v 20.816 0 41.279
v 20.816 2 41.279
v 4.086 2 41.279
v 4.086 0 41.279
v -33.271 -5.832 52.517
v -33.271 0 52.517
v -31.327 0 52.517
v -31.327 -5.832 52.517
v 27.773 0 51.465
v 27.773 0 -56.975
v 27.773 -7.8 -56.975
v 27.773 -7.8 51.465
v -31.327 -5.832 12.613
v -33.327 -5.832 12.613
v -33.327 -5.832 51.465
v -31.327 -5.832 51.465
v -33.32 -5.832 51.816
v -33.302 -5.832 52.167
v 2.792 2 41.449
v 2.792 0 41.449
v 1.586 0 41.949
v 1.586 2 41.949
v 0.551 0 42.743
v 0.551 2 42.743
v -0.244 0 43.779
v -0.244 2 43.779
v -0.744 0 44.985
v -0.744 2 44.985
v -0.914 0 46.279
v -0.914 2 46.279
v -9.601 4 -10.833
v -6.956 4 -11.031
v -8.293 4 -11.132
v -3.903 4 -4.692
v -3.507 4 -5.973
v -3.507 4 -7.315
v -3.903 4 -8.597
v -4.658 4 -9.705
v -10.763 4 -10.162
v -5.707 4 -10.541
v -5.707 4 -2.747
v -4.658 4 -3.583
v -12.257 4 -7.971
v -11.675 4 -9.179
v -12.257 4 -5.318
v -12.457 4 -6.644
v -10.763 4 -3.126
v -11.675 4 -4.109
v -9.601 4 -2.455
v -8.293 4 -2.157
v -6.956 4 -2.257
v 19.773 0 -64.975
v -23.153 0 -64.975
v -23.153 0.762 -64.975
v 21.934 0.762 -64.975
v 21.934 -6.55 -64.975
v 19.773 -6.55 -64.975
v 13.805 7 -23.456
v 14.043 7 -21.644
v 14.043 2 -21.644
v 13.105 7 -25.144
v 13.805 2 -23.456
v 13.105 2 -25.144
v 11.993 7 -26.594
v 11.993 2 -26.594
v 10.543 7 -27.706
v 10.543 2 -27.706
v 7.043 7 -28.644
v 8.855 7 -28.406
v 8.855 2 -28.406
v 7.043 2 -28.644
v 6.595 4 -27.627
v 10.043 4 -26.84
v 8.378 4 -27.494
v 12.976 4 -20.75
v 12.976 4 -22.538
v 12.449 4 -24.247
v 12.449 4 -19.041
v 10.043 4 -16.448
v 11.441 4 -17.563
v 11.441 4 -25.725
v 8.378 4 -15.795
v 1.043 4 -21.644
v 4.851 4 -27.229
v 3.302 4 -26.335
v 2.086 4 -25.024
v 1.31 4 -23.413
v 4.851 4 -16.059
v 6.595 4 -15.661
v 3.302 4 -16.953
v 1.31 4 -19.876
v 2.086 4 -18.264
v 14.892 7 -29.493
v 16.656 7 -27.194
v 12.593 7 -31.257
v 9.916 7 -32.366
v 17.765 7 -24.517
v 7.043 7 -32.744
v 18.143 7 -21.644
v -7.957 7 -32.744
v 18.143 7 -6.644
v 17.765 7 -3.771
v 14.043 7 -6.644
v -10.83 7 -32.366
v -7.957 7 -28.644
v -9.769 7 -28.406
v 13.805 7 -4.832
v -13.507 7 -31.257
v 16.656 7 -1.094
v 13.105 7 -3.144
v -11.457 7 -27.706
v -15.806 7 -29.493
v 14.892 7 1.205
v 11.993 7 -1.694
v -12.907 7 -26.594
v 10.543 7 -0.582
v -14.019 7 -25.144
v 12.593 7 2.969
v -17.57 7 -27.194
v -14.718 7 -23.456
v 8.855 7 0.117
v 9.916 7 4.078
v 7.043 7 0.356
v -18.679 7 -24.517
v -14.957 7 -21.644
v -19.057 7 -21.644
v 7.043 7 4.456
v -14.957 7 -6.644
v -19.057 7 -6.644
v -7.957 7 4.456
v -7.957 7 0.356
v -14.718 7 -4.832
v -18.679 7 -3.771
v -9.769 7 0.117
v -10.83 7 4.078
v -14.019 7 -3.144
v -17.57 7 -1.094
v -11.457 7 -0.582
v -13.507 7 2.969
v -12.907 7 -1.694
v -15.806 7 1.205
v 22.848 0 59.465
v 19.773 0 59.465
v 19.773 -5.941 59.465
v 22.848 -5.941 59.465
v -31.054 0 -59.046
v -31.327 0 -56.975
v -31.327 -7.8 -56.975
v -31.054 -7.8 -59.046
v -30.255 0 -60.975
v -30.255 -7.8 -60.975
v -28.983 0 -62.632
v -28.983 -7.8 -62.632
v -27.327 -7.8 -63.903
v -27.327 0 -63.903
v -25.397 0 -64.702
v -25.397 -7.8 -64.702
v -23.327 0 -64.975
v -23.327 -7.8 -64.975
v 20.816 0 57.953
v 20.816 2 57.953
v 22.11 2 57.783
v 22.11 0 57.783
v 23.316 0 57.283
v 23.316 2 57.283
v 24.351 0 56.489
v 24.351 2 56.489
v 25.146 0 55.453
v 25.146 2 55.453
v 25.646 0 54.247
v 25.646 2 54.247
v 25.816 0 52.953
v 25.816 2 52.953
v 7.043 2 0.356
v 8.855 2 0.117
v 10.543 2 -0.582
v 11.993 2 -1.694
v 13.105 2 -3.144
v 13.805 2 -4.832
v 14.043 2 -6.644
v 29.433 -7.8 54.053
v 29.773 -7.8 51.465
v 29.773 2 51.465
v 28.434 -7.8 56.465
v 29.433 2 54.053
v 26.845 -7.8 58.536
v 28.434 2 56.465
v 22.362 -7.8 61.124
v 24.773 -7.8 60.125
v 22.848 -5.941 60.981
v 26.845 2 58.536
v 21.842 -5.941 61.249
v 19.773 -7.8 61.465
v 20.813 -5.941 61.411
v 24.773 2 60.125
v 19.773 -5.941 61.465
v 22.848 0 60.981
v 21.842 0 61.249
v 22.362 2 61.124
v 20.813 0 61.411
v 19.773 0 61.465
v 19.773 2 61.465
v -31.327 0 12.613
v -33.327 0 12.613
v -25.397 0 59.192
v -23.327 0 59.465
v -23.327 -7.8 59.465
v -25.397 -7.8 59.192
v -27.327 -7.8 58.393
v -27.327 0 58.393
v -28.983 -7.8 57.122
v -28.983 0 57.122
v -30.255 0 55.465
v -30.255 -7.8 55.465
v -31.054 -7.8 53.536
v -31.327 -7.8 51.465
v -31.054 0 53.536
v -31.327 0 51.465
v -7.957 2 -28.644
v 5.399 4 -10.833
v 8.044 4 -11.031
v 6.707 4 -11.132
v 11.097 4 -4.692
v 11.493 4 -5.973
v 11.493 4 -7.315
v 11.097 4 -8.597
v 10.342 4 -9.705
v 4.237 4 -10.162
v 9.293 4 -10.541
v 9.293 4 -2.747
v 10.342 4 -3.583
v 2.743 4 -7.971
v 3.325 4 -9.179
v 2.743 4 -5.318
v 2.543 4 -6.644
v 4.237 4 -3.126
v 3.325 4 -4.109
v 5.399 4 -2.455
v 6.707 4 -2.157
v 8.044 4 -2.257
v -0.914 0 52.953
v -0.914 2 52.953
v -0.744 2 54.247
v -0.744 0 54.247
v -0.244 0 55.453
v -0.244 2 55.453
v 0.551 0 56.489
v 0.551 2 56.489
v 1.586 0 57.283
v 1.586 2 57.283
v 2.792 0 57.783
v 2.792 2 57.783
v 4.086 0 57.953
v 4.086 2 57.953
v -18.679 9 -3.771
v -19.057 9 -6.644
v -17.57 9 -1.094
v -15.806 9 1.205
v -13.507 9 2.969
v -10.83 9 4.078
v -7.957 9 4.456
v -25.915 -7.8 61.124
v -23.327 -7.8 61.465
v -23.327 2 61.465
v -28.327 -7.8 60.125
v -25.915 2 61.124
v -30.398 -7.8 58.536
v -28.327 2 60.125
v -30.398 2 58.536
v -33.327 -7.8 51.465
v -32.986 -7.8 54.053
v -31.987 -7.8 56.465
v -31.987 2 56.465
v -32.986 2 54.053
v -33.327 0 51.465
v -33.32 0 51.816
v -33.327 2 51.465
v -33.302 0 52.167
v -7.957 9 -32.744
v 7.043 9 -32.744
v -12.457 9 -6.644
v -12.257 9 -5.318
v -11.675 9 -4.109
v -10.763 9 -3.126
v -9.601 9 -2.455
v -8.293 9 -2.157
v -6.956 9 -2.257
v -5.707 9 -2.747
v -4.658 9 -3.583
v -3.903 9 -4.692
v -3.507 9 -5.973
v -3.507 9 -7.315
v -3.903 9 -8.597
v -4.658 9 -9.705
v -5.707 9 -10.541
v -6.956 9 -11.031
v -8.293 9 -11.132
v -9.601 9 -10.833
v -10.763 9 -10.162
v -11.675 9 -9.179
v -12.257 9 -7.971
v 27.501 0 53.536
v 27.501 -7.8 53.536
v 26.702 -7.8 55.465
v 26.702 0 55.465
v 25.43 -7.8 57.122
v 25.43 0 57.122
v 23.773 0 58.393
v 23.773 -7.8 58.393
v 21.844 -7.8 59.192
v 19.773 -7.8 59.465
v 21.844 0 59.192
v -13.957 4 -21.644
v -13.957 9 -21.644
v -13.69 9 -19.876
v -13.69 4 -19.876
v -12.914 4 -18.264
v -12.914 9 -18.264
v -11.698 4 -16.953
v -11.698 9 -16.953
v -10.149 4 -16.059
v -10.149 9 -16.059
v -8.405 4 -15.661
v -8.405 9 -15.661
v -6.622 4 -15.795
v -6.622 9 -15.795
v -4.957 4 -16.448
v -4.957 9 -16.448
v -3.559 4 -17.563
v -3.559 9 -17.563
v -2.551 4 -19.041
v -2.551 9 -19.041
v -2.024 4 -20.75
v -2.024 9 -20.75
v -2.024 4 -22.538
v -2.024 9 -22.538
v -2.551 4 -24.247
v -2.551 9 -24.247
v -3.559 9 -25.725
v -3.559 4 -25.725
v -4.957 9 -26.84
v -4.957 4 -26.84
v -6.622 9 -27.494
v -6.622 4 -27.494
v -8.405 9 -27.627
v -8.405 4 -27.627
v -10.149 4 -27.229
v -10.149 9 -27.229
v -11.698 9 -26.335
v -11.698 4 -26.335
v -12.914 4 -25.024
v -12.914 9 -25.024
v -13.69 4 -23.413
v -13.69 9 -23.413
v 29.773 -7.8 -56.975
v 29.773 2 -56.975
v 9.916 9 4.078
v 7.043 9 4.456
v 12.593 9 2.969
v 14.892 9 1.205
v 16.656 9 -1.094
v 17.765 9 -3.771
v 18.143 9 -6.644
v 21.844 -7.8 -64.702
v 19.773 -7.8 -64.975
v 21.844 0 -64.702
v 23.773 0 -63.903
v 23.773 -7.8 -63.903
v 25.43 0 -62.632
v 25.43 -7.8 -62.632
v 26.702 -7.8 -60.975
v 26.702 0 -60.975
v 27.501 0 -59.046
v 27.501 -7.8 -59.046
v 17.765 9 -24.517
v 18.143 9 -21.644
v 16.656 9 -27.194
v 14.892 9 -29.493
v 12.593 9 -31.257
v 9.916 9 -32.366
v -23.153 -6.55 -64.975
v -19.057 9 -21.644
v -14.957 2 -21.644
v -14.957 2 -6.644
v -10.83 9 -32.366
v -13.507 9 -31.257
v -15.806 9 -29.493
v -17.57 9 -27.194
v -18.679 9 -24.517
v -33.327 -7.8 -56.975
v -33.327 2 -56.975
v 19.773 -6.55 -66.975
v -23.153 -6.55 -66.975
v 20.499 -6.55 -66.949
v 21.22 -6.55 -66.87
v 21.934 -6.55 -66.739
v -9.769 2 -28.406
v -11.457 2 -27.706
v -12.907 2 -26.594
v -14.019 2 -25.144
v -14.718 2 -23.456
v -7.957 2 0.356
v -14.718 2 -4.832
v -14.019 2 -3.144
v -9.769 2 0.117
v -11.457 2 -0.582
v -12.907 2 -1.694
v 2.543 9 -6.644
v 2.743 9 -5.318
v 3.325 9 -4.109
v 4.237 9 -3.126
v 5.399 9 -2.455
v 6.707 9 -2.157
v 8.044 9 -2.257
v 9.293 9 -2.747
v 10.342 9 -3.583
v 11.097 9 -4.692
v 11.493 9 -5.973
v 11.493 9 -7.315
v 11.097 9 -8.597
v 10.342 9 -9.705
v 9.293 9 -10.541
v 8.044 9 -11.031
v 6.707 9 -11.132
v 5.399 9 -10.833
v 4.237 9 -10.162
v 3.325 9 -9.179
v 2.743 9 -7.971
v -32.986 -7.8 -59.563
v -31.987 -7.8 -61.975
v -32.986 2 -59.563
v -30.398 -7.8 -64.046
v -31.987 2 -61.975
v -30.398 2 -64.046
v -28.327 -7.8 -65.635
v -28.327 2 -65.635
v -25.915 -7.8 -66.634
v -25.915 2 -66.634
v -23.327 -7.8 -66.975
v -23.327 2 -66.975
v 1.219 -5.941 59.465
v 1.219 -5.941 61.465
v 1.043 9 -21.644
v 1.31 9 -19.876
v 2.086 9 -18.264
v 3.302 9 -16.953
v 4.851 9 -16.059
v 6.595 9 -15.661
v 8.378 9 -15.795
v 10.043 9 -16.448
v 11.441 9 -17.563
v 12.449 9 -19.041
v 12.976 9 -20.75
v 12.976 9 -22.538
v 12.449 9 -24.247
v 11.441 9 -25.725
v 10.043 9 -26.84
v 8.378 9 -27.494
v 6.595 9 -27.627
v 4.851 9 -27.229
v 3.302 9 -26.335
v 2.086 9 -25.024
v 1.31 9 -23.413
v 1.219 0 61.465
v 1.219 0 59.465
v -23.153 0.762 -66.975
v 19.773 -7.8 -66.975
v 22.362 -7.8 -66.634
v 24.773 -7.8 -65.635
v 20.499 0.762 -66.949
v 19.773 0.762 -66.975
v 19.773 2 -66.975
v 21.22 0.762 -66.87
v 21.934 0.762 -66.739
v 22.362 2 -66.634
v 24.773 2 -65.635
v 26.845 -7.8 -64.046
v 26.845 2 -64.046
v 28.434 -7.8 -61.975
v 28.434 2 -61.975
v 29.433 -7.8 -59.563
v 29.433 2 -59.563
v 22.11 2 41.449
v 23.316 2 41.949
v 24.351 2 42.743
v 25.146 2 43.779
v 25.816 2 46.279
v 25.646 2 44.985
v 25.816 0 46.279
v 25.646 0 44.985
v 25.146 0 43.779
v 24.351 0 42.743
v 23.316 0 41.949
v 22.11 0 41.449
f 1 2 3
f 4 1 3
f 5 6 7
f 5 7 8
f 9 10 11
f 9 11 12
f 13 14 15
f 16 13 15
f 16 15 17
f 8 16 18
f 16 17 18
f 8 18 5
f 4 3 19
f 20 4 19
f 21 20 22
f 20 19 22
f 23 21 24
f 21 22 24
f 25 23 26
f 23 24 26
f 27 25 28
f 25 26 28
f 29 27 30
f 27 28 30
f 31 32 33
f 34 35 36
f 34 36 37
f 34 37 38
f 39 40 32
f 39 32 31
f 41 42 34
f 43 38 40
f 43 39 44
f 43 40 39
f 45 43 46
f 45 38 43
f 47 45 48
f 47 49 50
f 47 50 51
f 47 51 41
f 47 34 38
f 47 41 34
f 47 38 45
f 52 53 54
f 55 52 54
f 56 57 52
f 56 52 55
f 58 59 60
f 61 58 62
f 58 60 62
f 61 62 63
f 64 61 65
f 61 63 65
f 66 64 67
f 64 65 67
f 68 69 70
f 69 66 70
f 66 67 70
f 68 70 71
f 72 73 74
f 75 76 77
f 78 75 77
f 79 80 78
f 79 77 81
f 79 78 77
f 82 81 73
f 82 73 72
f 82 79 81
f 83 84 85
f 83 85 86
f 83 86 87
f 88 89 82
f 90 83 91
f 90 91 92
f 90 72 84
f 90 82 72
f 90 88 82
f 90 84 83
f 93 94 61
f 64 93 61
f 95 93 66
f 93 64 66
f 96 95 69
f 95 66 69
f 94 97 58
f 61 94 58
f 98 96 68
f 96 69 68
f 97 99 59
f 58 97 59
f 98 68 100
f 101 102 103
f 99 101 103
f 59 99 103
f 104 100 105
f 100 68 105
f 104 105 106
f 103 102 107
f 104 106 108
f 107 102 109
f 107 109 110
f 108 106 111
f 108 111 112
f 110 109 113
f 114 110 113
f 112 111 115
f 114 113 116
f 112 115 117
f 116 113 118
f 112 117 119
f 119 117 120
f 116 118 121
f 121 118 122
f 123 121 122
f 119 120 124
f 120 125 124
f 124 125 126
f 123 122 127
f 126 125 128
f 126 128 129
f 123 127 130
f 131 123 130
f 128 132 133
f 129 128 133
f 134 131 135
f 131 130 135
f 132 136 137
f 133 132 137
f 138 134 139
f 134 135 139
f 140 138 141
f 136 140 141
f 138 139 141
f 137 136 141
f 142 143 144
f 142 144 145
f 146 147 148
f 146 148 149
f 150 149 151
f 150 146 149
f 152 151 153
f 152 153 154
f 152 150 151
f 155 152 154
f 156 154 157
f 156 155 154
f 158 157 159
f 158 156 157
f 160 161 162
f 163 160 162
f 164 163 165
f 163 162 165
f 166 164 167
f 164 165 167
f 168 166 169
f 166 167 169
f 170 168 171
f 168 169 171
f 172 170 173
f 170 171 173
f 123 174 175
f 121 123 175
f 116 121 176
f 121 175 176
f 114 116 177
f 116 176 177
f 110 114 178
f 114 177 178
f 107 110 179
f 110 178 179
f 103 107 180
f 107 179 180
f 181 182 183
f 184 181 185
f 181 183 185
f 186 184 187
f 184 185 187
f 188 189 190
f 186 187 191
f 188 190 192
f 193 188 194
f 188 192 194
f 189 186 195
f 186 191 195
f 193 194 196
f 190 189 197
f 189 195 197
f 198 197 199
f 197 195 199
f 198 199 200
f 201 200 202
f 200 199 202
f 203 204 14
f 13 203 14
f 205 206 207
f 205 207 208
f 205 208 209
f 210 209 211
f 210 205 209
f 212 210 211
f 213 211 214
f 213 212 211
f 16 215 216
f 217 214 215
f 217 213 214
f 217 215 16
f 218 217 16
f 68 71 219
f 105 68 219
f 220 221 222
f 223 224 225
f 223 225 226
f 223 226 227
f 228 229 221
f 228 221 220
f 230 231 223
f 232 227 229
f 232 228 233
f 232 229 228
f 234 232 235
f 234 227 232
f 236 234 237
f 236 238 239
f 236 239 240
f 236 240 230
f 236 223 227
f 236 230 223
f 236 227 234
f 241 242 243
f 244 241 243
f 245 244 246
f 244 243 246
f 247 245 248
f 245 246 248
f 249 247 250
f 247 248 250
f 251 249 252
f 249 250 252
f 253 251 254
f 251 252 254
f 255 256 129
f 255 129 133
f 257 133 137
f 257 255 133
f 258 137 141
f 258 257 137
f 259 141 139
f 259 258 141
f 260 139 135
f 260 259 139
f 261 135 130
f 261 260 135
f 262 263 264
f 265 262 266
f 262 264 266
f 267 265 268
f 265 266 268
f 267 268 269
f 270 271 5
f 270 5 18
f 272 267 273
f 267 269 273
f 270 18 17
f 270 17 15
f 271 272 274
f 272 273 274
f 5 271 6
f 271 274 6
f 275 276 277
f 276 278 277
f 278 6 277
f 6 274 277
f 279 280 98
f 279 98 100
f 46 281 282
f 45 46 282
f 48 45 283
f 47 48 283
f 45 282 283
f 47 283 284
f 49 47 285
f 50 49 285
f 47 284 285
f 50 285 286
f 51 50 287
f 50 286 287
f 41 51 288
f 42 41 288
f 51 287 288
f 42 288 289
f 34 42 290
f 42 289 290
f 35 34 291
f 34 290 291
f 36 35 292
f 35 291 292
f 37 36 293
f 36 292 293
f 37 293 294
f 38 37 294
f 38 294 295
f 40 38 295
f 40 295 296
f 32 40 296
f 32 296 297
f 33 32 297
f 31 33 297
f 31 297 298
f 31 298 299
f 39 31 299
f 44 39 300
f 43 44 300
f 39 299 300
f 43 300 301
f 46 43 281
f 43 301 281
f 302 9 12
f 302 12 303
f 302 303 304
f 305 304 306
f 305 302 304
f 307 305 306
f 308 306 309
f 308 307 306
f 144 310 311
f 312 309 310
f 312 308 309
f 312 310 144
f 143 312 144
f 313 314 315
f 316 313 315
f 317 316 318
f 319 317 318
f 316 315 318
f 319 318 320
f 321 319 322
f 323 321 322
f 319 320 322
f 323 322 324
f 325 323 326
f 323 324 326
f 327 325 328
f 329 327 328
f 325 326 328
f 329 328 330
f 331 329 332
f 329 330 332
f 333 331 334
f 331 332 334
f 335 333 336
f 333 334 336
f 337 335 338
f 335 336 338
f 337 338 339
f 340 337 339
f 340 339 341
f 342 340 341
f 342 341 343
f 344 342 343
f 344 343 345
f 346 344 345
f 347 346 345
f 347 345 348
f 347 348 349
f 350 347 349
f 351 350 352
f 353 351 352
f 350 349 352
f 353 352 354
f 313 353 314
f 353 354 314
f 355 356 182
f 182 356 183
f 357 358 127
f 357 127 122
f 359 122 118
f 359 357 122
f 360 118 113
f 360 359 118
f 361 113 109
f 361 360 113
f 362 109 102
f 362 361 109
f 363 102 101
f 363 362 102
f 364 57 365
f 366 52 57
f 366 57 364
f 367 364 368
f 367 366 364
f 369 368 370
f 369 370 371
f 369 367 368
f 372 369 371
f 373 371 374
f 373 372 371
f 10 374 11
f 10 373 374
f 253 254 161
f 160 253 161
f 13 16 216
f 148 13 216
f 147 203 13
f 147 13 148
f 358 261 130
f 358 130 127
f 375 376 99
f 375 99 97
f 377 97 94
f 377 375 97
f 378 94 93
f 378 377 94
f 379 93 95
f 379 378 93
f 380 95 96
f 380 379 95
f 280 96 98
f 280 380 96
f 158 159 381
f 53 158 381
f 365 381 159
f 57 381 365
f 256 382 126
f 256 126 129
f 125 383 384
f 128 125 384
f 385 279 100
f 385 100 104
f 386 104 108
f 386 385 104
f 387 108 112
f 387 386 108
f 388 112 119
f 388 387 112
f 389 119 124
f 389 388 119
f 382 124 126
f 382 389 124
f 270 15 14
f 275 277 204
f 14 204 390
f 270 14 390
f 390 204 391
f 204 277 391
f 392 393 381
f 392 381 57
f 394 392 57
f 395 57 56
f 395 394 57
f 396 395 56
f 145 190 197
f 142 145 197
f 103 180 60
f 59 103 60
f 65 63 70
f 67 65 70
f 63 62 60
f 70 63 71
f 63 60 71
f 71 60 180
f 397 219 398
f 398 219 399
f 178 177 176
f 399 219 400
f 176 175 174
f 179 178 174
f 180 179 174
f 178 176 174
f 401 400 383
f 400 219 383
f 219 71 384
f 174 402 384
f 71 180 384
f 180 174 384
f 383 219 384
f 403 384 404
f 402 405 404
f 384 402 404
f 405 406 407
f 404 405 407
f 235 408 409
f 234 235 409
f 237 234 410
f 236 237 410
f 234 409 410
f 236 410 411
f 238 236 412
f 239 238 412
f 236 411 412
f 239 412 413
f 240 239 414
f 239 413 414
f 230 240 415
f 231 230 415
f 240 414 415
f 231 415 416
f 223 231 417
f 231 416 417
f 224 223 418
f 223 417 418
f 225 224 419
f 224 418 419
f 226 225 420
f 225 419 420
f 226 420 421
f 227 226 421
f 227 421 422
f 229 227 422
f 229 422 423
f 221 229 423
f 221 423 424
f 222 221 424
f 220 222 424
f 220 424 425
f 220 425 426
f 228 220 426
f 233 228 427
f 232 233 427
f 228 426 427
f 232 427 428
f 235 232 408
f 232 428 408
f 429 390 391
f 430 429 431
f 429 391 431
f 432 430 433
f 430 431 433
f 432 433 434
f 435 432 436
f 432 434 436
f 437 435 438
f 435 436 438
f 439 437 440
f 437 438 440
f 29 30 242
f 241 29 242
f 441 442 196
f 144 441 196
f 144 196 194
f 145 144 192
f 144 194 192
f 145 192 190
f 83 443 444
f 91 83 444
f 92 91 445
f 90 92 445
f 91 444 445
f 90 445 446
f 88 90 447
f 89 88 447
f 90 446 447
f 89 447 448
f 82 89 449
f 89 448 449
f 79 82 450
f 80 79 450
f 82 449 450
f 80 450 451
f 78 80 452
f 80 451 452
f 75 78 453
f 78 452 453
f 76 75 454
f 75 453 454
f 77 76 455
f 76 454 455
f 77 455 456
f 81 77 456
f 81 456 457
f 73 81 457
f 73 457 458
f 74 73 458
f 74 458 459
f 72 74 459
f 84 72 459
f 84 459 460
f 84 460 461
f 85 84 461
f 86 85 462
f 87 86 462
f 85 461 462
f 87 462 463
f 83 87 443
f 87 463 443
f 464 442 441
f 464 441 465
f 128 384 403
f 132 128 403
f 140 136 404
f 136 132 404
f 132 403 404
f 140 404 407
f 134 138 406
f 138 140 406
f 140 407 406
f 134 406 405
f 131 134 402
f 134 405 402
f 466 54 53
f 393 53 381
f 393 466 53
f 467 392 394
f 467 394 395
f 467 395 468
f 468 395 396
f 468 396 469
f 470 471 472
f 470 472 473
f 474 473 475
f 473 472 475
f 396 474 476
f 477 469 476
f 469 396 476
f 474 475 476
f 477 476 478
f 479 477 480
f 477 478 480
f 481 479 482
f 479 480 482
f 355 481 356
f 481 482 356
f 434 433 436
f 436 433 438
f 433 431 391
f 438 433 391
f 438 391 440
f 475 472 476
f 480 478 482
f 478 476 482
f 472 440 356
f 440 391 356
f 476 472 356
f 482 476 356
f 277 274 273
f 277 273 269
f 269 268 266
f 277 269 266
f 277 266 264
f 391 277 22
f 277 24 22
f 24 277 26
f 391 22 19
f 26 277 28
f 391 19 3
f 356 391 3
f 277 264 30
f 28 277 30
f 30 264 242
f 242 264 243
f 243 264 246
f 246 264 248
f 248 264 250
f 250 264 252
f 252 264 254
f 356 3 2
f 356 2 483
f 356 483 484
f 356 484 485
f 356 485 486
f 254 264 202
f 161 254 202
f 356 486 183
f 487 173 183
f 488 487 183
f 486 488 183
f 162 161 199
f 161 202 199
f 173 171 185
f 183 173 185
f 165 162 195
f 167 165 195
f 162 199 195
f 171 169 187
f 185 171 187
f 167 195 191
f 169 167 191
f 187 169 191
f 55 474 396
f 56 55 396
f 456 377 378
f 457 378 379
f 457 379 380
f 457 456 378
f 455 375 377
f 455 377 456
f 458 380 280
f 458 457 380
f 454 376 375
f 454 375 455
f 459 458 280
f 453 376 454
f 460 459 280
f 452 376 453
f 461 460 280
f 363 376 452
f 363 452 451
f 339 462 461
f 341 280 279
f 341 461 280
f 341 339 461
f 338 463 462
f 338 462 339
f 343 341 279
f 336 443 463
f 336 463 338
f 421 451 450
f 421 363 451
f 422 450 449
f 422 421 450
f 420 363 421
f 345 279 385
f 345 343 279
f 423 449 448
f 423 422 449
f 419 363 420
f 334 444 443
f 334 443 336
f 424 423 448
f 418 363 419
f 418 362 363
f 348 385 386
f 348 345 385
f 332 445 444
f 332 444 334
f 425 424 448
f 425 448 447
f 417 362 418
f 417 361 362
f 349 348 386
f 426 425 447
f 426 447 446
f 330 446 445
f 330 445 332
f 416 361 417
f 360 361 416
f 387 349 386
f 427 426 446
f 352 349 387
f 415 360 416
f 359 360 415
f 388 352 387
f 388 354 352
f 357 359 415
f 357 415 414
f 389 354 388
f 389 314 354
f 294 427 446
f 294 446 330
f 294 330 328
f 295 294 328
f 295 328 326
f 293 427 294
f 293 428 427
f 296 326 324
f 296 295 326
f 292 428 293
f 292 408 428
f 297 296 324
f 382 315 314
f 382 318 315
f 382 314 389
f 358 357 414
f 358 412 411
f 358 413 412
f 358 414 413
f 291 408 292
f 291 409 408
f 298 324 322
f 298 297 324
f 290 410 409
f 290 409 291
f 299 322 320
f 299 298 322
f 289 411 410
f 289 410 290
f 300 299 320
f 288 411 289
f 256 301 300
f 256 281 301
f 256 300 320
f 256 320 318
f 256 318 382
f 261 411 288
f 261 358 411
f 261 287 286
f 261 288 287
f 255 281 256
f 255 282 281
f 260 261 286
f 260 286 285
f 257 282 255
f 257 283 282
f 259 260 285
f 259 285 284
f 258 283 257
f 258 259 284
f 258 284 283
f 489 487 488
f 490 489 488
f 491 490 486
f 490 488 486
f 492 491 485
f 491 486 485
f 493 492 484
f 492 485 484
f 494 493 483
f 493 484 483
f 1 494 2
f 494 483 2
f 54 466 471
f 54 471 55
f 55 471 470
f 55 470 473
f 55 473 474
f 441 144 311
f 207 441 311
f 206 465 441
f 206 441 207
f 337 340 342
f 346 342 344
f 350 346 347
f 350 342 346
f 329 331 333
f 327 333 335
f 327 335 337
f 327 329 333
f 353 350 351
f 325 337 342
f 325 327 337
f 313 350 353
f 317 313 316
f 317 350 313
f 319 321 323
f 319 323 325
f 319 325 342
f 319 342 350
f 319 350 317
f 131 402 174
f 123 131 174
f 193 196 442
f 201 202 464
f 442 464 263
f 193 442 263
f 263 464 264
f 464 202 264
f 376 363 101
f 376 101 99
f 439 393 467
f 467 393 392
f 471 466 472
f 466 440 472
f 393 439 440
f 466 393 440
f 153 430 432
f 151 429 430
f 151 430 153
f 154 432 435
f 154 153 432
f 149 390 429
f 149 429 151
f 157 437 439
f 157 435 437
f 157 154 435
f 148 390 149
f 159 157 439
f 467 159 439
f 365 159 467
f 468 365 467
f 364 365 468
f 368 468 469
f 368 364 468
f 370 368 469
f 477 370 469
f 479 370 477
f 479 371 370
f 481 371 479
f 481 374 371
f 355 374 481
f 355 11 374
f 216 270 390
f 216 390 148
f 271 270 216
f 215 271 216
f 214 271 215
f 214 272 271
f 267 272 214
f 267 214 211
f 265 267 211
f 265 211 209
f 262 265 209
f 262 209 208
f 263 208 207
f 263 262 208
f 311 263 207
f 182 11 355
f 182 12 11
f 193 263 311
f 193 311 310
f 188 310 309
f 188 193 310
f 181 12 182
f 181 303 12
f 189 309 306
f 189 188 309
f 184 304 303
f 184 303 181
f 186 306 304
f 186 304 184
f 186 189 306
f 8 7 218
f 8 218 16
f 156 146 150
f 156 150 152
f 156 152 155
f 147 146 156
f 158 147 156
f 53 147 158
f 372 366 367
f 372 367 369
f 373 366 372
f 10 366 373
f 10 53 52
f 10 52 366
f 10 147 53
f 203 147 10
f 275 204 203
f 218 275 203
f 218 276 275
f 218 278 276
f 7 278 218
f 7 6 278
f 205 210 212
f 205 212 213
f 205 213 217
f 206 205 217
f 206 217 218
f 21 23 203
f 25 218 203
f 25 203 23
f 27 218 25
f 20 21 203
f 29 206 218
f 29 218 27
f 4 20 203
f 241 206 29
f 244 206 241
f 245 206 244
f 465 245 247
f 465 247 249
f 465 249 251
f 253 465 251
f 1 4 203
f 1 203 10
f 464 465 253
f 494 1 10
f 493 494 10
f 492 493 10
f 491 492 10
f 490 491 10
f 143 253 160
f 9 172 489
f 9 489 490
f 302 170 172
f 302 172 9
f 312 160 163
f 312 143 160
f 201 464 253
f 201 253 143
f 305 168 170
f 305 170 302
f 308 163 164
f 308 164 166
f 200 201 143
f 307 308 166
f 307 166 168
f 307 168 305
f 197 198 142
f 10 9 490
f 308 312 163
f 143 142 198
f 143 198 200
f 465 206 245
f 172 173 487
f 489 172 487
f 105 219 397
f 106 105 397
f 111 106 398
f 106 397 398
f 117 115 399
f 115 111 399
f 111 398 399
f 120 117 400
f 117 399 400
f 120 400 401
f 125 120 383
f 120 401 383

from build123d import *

# Parameters (mm, degrees)
F1_DEPTH  = 7.8
F2_T      = 2
F4_DEPTH  = 9.801
F5_W      = 45.0870413333
F5_H      = 7.3114127154
F6_DEPTH  = 2
F7_W      = 5.831967108
F7_H      = 39.9042963982
F8_DEPTH  = 2
F9_W      = 21.6295962455
F9_H      = 5.9405225329
F10_DEPTH = 2
F13_DEPTH = 7
F16_DEPTH = 2
F14_R     = 4.5
F14_R_2   = 6
F17_DEPTH = 155
F18_DEPTH = 5


# Not quite as in the source:
# - an extrude ends at something that could not be found from the text; its depth is read off the source's solid


with BuildPart() as f1:
    # F0 (on Front) → F1 (new body)
    with BuildSketch(Plane.XZ):
        with BuildLine():
            Line((-23.3265317287, -64.975), (19.7734682713, -64.975))
            ThreePointArc((19.7734682713, -64.975), (25.4303225208, -62.6318542495), (27.7734682713, -56.975))
            Line((27.7734682713, -56.975), (27.7734682713, 51.465))
            ThreePointArc((27.7734682713, 51.465), (25.4303225208, 57.1218542495), (19.7734682713, 59.465))
            Line((19.7734682713, 59.465), (-23.3265317287, 59.465))
            ThreePointArc((-23.3265317287, 59.465), (-28.9833859782, 57.1218542495), (-31.3265317287, 51.465))
            Line((-31.3265317287, 51.465), (-31.3265317287, -56.975))
            ThreePointArc((-31.3265317287, -56.975), (-28.9833859782, -62.6318542495), (-23.3265317287, -64.975))
        make_face()
    extrude(amount=F1_DEPTH)

    # F2
    f2_openings = [f1.faces().sort_by_distance(p)[0] for p in [
        (-1.776532, -7.8, -2.755),
    ]]
    offset(amount=F2_T, openings=f2_openings, kind=Kind.INTERSECTION)

    # F3 (on face) → F4 (cut, through all)
    with BuildSketch(Plane(origin=(0, 2, 0), x_dir=(-1, 0, 0), z_dir=(0, 1, 0))):
        with BuildLine():
            Line((-4.0860684775, 57.9532251436), (-20.8159385248, 57.9532251436))
            ThreePointArc((-20.8159385248, 57.9532251436), (-24.3514724307, 56.4887590495), (-25.8159385248, 52.9532251436))
            Line((-25.8159385248, 52.9532251436), (-25.8159385248, 46.2790104747))
            ThreePointArc((-25.8159385248, 46.2790104747), (-24.3514724307, 42.7434765687), (-20.8159385248, 41.2790104747))
            Line((-20.8159385248, 41.2790104747), (-4.0860684775, 41.2790104747))
            ThreePointArc((-4.0860684775, 41.2790104747), (-0.5505345715, 42.7434765687), (0.9139315225, 46.2790104747))
            Line((0.9139315225, 46.2790104747), (0.9139315225, 52.9532251436))
            ThreePointArc((0.9139315225, 52.9532251436), (-0.5505345715, 56.4887590495), (-4.0860684775, 57.9532251436))
        make_face()
    extrude(amount=-F4_DEPTH, mode=Mode.SUBTRACT)

    # F5 (on face) → F6 (cut)
    with BuildSketch(Plane(origin=(0, 0, -66.975), x_dir=(1, 0, 0), z_dir=(0, 0, -1))):
        with Locations((-0.6092851982, 2.8941009077)):
            Rectangle(F5_W, F5_H)
    extrude(amount=-F6_DEPTH, mode=Mode.SUBTRACT)

    # F7 (on face) → F8 (cut)
    with BuildSketch(Plane(origin=(-33.3265317287, 0, 0), x_dir=(0, -1, 0), z_dir=(-1, 0, 0))):
        with Locations((2.915983554, 32.564714551)):
            Rectangle(F7_W, F7_H)
    extrude(amount=-F8_DEPTH, mode=Mode.SUBTRACT)

    # F9 (on face) → F10 (cut)
    with BuildSketch(Plane.XY.offset(61.465)):
        with Locations((12.0333628147, -2.9702612665)):
            Rectangle(F9_W, F9_H)
    extrude(amount=-F10_DEPTH, mode=Mode.SUBTRACT)

    # F14 (on face) → F17 (cut, through all)
    with BuildSketch(Plane(origin=(0, 9, 0), x_dir=(-1, 0, 0), z_dir=(0, 1, 0))):
        with Locations((-7.0430367999, -6.644173318)):
            Circle(F14_R)
        with Locations((7.9569632001, -6.644173318)):
            Circle(F14_R)
        with Locations((-7.0430367999, -21.644173318)):
            Circle(F14_R_2)
        with Locations((7.9569632001, -21.644173318)):
            Circle(F14_R_2)
    extrude(amount=F17_DEPTH, mode=Mode.SUBTRACT)


with BuildPart() as f13:
    # F12 (on face) → F13 (new body)
    with BuildSketch(Plane(origin=(0, 2, 0), x_dir=(-1, 0, 0), z_dir=(0, 1, 0))):
        with BuildLine():
            ThreePointArc((-14.0430367999, -21.644173318), (-11.9927842682, -26.5939207863), (-7.0430367999, -28.644173318))
            Line((-7.0430367999, -28.644173318), (7.9569632001, -28.644173318))
            ThreePointArc((7.9569632001, -28.644173318), (12.9067106684, -26.5939207863), (14.9569632001, -21.644173318))
            Line((14.9569632001, -21.644173318), (14.9569632001, -6.644173318))
            ThreePointArc((14.9569632001, -6.644173318), (12.9067106684, -1.6944258497), (7.9569632001, 0.355826682))
            Line((7.9569632001, 0.355826682), (-7.0430367999, 0.355826682))
            ThreePointArc((-7.0430367999, 0.355826682), (-11.9927842682, -1.6944258497), (-14.0430367999, -6.644173318))
            Line((-14.0430367999, -6.644173318), (-14.0430367999, -21.644173318))
        make_face()
    extrude(amount=F13_DEPTH)

    # F15 (on face) → F16 (join)
    with BuildSketch(Plane(origin=(0, 9, 0), x_dir=(-1, 0, 0), z_dir=(0, 1, 0))):
        with BuildLine():
            Line((7.9569632001, 4.4558267109), (-7.0430367999, 4.4558267109))
            ThreePointArc((-7.0430367999, 4.4558267109), (-14.8919220915, 1.2047119736), (-18.1430368288, -6.644173318))
            Line((-18.1430368288, -6.644173318), (-18.1430368288, -21.644173318))
            ThreePointArc((-18.1430368288, -21.644173318), (-14.8919220915, -29.4930586096), (-7.0430367999, -32.7441733469))
            Line((-7.0430367999, -32.7441733469), (7.9569632001, -32.7441733469))
            ThreePointArc((7.9569632001, -32.7441733469), (15.8058484917, -29.4930586096), (19.056963229, -21.644173318))
            Line((19.056963229, -21.644173318), (19.056963229, -6.644173318))
            ThreePointArc((19.056963229, -6.644173318), (15.8058484917, 1.2047119736), (7.9569632001, 4.4558267109))
        make_face()
        with BuildLine():
            Line((-14.0430367999, -21.644173318), (-14.0430367999, -6.644173318))
            ThreePointArc((-14.0430367999, -6.644173318), (-11.9927842682, -1.6944258497), (-7.0430367999, 0.355826682))
            Line((-7.0430367999, 0.355826682), (7.9569632001, 0.355826682))
            ThreePointArc((7.9569632001, 0.355826682), (12.9067106684, -1.6944258497), (14.9569632001, -6.644173318))
            Line((14.9569632001, -6.644173318), (14.9569632001, -21.644173318))
            ThreePointArc((14.9569632001, -21.644173318), (12.9067106684, -26.5939207863), (7.9569632001, -28.644173318))
            Line((7.9569632001, -28.644173318), (-7.0430367999, -28.644173318))
            ThreePointArc((-7.0430367999, -28.644173318), (-11.9927842682, -26.5939207863), (-14.0430367999, -21.644173318))
        make_face(mode=Mode.SUBTRACT)
    extrude(amount=-F16_DEPTH)

    # F14 (on face) → F18 (cut)
    with BuildSketch(Plane(origin=(0, 9, 0), x_dir=(-1, 0, 0), z_dir=(0, 1, 0))):
        with Locations((7.9569632001, -6.644173318)):
            Circle(F14_R)
        with Locations((-7.0430367999, -6.644173318)):
            Circle(F14_R)
        with Locations((-7.0430367999, -21.644173318)):
            Circle(F14_R_2)
        with Locations((7.9569632001, -21.644173318)):
            Circle(F14_R_2)
    extrude(amount=-F18_DEPTH, mode=Mode.SUBTRACT)


solid = Compound([f1.part, f13.part])
